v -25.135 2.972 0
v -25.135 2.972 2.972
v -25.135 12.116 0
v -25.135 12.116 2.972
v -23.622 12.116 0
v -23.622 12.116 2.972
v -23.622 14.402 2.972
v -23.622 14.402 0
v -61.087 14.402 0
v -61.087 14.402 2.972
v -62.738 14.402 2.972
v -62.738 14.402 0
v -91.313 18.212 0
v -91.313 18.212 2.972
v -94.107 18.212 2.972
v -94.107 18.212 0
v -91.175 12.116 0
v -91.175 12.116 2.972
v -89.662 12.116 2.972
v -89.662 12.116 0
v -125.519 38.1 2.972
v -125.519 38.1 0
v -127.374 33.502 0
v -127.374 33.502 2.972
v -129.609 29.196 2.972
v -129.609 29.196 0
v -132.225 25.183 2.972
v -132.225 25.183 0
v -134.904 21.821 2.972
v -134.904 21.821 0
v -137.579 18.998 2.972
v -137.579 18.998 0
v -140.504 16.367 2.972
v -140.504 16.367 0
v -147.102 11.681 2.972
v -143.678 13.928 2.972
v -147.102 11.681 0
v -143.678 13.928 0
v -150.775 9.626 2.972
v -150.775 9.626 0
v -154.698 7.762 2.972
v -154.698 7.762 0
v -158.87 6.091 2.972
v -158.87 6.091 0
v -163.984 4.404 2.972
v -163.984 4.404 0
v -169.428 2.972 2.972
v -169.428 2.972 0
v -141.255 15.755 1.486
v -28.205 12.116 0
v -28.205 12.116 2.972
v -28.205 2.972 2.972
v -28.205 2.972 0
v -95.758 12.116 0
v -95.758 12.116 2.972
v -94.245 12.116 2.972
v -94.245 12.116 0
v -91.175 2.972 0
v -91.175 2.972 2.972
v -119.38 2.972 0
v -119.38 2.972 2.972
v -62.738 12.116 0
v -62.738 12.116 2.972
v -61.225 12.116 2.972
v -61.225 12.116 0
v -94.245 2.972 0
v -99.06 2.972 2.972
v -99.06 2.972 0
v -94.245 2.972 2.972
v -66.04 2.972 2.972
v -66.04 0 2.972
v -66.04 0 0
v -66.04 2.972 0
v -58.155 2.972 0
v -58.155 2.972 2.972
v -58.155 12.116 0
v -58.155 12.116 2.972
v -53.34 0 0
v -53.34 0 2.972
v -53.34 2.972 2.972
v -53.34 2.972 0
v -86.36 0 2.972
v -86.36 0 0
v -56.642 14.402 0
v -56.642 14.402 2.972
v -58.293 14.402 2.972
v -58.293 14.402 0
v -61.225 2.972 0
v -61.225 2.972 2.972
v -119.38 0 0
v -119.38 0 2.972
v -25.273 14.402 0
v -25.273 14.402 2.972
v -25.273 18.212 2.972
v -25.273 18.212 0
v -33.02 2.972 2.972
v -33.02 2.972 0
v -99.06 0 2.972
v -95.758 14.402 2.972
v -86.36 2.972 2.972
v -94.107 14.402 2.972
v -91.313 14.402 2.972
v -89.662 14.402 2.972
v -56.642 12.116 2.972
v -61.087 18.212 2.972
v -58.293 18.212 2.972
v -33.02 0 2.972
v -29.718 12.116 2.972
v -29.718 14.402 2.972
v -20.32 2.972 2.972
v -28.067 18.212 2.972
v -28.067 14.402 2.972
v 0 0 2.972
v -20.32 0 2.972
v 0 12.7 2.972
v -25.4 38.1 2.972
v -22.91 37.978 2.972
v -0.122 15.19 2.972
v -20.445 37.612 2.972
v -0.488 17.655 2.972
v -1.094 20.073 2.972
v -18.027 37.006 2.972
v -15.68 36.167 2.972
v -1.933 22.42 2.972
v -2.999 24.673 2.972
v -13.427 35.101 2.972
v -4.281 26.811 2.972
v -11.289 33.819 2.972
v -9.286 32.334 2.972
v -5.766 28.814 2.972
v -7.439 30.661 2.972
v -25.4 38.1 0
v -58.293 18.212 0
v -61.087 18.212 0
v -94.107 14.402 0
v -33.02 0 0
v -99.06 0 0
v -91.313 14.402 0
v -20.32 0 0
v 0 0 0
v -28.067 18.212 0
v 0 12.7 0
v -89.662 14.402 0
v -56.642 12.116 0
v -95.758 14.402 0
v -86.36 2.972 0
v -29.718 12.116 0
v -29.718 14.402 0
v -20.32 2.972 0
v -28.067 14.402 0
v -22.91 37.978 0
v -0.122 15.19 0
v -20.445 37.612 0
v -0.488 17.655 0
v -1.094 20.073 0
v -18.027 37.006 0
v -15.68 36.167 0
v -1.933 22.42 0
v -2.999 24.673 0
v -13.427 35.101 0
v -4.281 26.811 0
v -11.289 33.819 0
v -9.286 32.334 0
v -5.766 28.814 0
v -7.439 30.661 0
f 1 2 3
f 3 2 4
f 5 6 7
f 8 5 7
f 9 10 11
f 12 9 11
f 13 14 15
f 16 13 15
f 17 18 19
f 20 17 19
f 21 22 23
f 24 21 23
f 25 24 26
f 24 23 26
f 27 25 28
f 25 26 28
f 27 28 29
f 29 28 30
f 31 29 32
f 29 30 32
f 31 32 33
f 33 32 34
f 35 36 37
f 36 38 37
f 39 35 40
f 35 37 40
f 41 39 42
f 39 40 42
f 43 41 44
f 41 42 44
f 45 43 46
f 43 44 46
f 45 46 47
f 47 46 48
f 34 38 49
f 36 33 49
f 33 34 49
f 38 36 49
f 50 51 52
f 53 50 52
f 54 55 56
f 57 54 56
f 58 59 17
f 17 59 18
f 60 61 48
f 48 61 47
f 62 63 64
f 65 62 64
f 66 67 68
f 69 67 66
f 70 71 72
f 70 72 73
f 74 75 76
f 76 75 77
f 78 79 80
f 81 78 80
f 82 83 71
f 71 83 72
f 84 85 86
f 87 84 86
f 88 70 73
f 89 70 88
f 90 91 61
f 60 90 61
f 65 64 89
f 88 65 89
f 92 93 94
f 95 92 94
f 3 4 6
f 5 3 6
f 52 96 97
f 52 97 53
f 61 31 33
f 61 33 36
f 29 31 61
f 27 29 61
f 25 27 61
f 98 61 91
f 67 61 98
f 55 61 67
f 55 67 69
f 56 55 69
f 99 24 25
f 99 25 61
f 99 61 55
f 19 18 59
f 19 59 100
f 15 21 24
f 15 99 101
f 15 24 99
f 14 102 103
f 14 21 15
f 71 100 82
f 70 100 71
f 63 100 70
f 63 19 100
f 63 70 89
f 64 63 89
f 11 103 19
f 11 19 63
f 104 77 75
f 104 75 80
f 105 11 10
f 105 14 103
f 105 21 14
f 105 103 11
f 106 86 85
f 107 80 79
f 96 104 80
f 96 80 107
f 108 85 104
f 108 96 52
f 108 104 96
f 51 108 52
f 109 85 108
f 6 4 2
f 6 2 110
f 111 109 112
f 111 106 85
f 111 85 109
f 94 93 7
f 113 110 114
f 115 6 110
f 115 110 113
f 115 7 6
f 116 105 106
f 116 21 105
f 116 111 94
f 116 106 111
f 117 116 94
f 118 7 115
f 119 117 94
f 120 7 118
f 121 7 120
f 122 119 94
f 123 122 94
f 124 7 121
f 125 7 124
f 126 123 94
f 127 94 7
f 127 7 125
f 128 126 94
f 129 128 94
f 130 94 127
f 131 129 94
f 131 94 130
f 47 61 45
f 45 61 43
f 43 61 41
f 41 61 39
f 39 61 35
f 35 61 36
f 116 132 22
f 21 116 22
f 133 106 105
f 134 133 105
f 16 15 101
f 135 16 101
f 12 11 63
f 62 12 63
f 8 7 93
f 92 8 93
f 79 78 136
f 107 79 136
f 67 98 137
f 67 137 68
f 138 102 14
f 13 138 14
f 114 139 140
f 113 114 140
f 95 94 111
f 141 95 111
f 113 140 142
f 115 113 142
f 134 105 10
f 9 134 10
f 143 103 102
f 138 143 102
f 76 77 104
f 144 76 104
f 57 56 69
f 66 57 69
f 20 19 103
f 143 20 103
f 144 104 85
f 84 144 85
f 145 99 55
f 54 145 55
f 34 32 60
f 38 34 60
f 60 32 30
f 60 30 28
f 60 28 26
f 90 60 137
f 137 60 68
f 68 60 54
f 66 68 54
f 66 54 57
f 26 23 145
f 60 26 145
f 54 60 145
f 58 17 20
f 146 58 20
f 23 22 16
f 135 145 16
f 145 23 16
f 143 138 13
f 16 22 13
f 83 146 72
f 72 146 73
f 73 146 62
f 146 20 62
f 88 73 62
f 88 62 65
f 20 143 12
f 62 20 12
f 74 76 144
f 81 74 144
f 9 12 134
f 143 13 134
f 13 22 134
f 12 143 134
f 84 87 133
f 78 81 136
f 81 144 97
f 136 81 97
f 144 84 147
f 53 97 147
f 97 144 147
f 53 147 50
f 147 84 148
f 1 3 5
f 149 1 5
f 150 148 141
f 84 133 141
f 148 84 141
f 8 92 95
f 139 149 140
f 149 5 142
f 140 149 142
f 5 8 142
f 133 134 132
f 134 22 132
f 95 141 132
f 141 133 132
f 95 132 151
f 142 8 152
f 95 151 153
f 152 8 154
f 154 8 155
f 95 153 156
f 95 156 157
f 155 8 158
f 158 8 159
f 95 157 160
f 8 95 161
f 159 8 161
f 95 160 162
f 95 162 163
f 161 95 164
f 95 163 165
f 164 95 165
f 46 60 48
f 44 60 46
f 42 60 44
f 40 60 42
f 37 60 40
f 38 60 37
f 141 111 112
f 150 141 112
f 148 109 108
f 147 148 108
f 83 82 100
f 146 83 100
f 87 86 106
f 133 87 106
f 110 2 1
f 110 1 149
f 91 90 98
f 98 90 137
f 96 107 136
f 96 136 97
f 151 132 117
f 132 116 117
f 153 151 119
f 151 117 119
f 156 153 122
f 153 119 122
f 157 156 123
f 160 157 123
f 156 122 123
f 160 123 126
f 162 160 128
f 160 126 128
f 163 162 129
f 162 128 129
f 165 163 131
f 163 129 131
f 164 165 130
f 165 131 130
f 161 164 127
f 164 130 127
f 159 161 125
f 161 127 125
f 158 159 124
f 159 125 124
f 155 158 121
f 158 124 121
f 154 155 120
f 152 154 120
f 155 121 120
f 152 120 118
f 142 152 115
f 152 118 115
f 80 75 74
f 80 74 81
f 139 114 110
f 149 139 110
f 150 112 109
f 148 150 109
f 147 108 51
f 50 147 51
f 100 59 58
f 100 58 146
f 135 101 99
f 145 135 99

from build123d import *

# Parameters (mm, degrees)
BOSS_EXTRUDE2_DEPTH = 2.9718
SKETCH4_W           = 12.7
SKETCH4_H           = 2.972153091
CUT_EXTRUDE1_DEPTH  = 2.9718
CUT_EXTRUDE2_DEPTH  = 2.9718
FILLET1_R           = 25.4


with BuildPart() as part:
    # Sketch2 → Boss-Extrude2 (new body)
    with BuildSketch(Plane.XY):
        with BuildLine():
            Line((-190.5, 0), (0, 0))
            Line((0, 0), (0, 38.1))
            Line((0, 38.1), (-125.518660072, 38.1))
            add(Edge.make_bspline(
                [(-125.518660072, 38.1), (-137.686277491, 3.422332996), (-190.5, 0)],
                knots=[0, 0, 0, 1, 1, 1], degree=2))
        make_face()
    extrude(amount=BOSS_EXTRUDE2_DEPTH)

    # Sketch4 → Cut-Extrude1 (cut)
    with BuildSketch(Plane.XY.offset(2.9718)):
        with Locations((-26.67, 1.486076546)):
            Rectangle(SKETCH4_W, SKETCH4_H)
        with Locations((-59.69, 1.486076546)):
            Rectangle(SKETCH4_W, SKETCH4_H)
        with Locations((-92.71, 1.486076546)):
            Rectangle(SKETCH4_W, SKETCH4_H)
        with BuildLine():
            add(Edge.make_bspline(
                [(-169.427921187, 2.972153091), (-179.000448456, 0.745171762), (-190.5, 0)],
                knots=[0.782262052, 0.782262052, 0.782262052, 1, 1, 1], degree=2))
            Line((-190.5, 0), (-119.38, 0))
            Line((-119.38, 0), (-119.38, 2.972153091))
            Line((-119.38, 2.972153091), (-169.427921187, 2.972153091))
        make_face()
    extrude(amount=-CUT_EXTRUDE1_DEPTH, mode=Mode.SUBTRACT)

    # Sketch5 → Cut-Extrude2 (cut)
    with BuildSketch(Plane.XY.offset(2.9718)):
        Polygon((-91.313, 14.402153091), (-91.313, 18.212153091), (-94.107, 18.212153091), (-94.107, 14.402153091), (-95.758, 14.402153091), (-95.758, 12.116153091), (-94.244804958, 12.116153091), (-94.244804958, 2.972153091), (-91.175195042, 2.972153091), (-91.175195042, 12.116153091), (-89.662, 12.116153091), (-89.662, 14.402153091), align=None)
        Polygon((-58.293, 14.402153091), (-58.293, 18.212153091), (-61.087, 18.212153091), (-61.087, 14.402153091), (-62.738, 14.402153091), (-62.738, 12.116153091), (-61.224804958, 12.116153091), (-61.224804958, 2.972153091), (-58.155195042, 2.972153091), (-58.155195042, 12.116153091), (-56.642, 12.116153091), (-56.642, 14.402153091), align=None)
        Polygon((-26.67, 2.972153091), (-26.67, 18.212153091), (-28.067, 18.212153091), (-28.067, 14.402153091), (-29.718, 14.402153091), (-29.718, 12.116153091), (-28.204804958, 12.116153091), (-28.204804958, 2.972153091), align=None)
        Polygon((-25.273, 18.212153091), (-26.67, 18.212153091), (-26.67, 2.972153091), (-25.135195042, 2.972153091), (-25.135195042, 12.116153091), (-23.622, 12.116153091), (-23.622, 14.402153091), (-25.273, 14.402153091), align=None)
    extrude(amount=-CUT_EXTRUDE2_DEPTH, mode=Mode.SUBTRACT)

    # Fillet1
    fillet1_edges = [part.edges().sort_by_distance(p)[0] for p in [
        (0, 38.1, 1.4859),
    ]]
    fillet(fillet1_edges, radius=FILLET1_R)


solid = part.part
